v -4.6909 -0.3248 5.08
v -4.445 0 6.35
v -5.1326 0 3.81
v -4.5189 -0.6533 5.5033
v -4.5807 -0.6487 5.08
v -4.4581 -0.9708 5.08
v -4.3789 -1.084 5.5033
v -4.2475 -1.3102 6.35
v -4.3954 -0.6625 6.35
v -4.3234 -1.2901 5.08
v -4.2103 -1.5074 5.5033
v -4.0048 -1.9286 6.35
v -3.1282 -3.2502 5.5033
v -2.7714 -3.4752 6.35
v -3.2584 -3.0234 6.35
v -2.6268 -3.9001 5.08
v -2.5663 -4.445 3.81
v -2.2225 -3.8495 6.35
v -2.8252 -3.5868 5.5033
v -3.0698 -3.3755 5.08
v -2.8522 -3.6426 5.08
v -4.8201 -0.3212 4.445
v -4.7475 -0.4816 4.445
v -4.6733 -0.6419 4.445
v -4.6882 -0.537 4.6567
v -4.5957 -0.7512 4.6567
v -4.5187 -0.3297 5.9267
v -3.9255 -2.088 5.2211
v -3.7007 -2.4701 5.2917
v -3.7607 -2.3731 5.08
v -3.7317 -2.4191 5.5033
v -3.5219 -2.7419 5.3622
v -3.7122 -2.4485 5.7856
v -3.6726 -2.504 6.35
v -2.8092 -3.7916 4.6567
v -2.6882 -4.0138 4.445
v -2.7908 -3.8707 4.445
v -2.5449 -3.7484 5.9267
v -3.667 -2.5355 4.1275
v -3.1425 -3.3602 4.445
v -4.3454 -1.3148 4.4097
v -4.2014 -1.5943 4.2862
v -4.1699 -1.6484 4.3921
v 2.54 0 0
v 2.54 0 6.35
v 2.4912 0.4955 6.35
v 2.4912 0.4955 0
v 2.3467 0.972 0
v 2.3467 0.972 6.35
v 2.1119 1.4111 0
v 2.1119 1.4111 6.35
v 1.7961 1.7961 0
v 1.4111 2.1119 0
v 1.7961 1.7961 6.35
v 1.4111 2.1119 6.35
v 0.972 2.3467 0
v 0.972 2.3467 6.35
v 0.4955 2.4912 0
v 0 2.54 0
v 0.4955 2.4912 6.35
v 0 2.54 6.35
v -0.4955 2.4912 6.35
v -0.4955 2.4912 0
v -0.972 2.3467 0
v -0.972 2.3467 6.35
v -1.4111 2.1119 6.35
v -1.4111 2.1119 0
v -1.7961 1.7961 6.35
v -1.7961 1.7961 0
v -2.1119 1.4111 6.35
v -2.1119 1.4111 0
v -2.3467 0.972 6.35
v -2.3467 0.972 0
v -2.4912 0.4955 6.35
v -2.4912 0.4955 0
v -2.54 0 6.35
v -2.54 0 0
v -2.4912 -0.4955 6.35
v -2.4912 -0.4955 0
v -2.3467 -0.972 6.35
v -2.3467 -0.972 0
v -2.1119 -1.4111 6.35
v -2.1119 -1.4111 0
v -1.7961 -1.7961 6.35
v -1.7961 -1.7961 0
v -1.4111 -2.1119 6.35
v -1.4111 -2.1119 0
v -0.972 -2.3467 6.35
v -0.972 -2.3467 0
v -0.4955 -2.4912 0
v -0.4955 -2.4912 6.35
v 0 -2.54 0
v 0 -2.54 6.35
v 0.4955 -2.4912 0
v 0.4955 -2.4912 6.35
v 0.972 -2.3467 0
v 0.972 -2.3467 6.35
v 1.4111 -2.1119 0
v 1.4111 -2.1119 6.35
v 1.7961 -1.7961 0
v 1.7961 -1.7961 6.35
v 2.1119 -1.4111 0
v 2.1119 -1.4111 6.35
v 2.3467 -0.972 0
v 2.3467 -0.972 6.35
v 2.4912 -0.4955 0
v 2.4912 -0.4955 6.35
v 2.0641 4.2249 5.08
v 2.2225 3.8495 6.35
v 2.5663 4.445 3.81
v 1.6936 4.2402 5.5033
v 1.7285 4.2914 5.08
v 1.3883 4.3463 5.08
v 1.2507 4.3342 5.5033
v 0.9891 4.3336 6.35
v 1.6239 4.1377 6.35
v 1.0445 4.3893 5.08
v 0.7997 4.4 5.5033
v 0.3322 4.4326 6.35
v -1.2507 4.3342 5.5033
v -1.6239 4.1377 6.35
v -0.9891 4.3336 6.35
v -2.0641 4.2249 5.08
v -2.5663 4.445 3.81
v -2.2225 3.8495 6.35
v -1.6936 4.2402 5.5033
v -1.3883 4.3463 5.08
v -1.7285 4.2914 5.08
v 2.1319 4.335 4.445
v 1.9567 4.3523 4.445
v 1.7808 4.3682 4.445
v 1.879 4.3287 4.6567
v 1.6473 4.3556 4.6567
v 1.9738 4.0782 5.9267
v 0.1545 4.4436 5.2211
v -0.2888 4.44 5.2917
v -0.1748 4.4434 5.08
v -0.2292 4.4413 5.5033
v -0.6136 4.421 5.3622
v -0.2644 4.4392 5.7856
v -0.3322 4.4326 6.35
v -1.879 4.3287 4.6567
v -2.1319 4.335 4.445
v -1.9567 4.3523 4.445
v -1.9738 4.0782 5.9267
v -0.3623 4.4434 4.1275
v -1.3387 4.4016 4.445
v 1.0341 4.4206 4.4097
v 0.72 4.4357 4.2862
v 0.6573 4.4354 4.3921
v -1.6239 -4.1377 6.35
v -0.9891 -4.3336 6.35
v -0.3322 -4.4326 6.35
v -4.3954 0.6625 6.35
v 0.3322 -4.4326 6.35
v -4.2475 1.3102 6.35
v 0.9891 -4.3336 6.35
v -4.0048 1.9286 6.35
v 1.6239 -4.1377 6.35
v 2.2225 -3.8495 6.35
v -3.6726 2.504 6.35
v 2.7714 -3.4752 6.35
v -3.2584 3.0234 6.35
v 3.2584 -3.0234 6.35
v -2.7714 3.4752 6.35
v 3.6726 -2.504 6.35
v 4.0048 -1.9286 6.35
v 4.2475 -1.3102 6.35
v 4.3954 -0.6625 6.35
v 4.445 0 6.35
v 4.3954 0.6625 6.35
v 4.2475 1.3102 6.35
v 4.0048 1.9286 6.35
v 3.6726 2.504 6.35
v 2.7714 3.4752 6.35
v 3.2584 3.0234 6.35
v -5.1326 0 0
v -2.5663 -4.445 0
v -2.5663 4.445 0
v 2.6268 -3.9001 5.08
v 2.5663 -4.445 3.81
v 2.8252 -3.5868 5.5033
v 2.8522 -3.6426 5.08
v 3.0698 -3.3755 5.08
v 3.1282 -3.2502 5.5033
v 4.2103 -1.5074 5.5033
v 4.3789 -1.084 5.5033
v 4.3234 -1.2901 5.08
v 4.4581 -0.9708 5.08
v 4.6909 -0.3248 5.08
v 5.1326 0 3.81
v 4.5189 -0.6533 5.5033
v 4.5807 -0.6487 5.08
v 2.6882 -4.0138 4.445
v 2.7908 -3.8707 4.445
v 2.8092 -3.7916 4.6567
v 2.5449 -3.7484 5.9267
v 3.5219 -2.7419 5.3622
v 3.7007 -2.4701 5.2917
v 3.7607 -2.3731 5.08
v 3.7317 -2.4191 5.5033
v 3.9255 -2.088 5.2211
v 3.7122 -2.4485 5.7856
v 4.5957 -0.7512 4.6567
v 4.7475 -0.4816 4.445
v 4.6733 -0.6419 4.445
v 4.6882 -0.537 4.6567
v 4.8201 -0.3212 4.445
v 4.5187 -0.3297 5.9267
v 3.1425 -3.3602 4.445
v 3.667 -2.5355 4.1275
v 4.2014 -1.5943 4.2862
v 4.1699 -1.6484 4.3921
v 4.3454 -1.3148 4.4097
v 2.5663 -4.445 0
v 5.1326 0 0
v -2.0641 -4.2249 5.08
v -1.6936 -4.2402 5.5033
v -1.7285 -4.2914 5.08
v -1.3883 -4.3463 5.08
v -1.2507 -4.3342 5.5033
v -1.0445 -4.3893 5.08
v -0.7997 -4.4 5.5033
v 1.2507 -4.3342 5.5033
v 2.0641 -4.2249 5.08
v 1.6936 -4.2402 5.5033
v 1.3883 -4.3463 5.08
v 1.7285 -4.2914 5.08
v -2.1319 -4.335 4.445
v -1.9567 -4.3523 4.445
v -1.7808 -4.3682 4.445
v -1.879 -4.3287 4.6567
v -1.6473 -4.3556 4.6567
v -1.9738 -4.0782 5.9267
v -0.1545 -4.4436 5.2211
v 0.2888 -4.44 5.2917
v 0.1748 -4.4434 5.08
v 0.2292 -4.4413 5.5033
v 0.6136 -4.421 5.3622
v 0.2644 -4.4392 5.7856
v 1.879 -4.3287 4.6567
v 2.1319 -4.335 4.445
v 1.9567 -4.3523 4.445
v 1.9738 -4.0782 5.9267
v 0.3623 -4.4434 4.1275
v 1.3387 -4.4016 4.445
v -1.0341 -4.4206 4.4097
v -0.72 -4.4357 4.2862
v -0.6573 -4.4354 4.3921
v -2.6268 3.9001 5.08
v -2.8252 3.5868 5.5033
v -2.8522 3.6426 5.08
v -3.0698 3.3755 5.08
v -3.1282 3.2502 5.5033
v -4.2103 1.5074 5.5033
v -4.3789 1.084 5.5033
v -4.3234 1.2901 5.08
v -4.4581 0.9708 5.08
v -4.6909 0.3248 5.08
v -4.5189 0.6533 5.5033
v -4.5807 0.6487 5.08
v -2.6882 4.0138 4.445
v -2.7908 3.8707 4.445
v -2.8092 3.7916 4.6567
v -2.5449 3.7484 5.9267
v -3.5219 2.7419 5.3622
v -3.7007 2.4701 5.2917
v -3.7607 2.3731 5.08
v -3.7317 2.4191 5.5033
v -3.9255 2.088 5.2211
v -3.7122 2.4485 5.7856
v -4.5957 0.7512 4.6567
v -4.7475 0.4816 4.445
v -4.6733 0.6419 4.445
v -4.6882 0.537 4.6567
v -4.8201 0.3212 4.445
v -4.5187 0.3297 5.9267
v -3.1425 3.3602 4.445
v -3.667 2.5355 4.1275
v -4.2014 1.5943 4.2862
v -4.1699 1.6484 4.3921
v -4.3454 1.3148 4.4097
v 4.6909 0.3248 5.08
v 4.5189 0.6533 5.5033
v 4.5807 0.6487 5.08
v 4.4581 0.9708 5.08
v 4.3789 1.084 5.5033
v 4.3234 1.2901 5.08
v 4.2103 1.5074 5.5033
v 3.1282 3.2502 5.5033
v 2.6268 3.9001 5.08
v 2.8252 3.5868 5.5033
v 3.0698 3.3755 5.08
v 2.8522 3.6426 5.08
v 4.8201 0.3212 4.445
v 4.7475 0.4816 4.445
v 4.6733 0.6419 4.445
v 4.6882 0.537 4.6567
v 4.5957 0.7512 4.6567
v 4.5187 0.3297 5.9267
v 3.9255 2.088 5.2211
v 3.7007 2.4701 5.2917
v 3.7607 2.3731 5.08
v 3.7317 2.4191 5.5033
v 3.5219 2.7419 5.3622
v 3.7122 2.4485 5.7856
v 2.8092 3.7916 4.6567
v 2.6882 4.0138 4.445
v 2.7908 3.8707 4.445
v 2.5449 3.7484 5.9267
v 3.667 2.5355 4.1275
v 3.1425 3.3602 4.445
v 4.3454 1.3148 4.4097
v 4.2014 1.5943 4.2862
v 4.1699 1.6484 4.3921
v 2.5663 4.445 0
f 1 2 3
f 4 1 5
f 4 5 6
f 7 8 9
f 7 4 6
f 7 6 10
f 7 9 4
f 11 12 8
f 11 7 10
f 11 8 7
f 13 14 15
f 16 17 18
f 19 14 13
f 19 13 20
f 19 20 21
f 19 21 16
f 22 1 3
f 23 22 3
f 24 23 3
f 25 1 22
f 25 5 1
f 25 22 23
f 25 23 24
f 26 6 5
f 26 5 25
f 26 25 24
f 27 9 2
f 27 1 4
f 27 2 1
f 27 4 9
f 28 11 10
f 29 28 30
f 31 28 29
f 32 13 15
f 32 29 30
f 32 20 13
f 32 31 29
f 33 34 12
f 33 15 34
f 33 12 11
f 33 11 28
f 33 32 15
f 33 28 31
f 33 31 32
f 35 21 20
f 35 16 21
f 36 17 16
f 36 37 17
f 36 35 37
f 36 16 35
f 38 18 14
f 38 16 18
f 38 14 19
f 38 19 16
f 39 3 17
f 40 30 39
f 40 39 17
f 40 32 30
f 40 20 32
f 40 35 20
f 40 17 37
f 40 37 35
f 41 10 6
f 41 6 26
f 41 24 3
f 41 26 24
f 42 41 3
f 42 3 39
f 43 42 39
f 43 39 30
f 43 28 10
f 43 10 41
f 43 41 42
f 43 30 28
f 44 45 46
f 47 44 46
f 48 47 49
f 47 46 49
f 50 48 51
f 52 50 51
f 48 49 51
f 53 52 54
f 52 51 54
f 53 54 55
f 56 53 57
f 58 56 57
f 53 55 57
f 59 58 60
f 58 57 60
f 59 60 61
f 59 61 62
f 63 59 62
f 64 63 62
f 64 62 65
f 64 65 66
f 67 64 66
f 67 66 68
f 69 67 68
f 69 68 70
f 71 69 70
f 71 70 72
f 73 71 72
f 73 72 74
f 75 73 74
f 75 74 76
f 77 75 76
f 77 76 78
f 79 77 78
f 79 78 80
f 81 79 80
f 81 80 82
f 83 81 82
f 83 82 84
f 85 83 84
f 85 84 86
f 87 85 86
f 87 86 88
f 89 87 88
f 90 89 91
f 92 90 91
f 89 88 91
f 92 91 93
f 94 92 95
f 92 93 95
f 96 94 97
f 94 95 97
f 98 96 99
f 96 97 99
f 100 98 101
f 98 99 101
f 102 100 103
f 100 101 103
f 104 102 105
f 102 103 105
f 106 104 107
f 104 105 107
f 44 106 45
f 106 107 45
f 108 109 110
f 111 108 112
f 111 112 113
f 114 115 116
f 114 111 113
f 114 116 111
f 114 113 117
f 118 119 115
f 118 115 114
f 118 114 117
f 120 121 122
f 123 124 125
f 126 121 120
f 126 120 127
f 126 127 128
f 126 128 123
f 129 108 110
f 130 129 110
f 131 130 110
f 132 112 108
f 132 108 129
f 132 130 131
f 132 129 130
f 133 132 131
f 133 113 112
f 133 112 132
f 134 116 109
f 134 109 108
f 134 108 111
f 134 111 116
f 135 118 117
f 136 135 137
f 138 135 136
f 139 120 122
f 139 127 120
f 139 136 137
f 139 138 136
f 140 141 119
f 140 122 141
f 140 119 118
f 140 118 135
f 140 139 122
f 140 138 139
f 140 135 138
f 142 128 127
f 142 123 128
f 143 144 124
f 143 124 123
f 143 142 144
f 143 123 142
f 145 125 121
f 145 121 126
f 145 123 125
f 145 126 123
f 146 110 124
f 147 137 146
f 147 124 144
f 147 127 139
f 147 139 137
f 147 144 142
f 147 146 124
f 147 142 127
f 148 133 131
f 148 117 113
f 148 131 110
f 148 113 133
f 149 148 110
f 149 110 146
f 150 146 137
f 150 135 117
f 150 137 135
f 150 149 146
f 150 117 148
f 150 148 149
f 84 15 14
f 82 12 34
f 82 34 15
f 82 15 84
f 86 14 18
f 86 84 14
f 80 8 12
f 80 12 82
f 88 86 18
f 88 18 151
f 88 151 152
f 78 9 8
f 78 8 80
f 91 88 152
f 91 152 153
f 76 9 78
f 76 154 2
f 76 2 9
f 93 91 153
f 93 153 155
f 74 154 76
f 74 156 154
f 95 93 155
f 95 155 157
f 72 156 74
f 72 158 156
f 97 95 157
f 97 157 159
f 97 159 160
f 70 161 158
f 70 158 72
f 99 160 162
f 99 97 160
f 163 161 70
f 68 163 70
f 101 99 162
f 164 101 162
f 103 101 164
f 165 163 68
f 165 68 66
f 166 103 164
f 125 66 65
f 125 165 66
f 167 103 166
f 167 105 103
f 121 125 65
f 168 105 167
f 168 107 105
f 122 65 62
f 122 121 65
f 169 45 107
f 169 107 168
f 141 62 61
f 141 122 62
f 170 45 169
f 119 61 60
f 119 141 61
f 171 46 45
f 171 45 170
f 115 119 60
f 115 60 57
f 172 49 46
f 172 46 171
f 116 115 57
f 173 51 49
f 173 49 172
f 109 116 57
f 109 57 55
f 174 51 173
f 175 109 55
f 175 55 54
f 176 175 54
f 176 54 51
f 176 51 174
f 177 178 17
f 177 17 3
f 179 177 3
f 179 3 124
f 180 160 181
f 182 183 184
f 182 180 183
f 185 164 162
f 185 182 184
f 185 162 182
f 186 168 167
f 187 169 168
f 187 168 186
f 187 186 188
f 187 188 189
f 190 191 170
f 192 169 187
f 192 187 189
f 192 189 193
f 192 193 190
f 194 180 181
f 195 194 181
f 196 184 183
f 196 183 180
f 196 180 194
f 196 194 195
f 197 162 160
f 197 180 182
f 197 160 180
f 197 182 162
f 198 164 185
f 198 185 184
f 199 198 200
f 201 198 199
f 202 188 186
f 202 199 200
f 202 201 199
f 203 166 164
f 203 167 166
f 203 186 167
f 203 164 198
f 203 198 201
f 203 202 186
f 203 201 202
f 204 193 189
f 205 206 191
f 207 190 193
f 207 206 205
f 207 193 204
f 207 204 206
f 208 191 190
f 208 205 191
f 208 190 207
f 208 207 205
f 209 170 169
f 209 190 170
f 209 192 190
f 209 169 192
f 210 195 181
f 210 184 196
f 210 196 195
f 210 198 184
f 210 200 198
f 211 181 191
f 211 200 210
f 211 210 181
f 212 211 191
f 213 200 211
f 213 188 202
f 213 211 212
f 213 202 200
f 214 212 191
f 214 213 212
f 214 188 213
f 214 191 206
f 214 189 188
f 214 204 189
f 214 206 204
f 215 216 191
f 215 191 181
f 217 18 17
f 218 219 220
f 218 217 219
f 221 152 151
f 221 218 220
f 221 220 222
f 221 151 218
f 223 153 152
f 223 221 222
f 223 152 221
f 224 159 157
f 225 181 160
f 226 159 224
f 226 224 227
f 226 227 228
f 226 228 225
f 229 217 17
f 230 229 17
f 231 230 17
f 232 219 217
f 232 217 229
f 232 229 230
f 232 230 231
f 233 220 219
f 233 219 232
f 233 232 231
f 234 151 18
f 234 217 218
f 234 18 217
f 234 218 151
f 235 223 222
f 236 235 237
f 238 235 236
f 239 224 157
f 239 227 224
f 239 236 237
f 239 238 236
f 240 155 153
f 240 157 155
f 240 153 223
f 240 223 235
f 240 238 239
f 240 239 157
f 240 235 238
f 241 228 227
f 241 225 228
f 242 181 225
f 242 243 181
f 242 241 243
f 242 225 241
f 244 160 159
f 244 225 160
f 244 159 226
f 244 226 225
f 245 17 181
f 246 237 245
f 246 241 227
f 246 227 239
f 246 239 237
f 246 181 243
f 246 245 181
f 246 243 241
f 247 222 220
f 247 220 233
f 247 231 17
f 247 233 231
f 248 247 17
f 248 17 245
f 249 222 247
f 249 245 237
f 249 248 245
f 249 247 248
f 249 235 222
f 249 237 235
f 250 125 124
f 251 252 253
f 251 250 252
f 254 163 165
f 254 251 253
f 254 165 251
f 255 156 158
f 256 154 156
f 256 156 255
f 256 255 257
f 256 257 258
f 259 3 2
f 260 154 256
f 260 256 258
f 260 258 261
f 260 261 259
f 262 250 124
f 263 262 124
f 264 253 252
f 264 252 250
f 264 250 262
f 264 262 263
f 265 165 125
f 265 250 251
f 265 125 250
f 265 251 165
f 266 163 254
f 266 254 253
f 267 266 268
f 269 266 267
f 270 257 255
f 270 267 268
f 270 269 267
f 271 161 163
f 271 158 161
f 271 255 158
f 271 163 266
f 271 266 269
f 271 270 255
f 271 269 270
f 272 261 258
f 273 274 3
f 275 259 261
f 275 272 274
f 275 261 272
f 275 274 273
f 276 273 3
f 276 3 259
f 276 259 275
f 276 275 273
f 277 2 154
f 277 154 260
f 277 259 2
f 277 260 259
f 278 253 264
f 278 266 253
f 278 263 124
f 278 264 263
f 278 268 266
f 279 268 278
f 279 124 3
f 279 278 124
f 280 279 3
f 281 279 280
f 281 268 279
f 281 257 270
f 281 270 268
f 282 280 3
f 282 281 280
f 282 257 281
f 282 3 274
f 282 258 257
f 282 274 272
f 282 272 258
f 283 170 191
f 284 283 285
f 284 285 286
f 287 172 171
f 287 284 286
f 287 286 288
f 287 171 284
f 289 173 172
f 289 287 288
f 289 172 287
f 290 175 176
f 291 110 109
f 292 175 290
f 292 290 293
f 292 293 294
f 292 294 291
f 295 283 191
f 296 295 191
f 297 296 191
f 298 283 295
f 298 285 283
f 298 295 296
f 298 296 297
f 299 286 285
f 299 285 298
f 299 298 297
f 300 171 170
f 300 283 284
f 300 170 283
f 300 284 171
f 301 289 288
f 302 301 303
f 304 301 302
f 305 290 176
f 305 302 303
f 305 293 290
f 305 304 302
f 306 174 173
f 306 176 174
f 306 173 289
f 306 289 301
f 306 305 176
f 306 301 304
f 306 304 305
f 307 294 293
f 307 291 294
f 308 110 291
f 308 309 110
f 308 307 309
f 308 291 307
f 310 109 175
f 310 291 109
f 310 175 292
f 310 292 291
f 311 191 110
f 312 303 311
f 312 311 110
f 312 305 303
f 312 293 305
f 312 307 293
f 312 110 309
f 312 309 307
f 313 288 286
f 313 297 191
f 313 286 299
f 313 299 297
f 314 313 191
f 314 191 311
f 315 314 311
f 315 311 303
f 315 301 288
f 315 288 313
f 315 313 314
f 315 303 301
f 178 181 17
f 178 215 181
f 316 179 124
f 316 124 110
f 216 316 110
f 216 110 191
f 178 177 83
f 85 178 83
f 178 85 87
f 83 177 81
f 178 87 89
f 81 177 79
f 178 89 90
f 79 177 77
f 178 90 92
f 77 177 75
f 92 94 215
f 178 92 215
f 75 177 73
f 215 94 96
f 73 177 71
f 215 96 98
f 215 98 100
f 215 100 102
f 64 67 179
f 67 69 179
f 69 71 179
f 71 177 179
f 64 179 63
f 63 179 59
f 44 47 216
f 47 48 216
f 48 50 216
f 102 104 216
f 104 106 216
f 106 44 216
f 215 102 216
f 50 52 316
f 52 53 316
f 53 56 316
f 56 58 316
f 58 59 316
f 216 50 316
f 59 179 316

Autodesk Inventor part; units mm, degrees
ref_plane "YZ Plane" through (0, 0, 0) normal (1, 0, 0) x (0, 1, 0)
ref_plane "XZ Plane" through (0, 0, 0) normal (0, 1, 0) x (-1, 0, 0)
sketch "Sketch1" plane through (0, 0, 0) normal (0, 0, 1) x (1, 0, 0)
  line L0 (2.5663, 4.445) -> (5.1326, 0)
  line L1 (5.1326, 0) -> (2.5663, -4.445)
  line L2 (2.5663, -4.445) -> (-2.5663, -4.445)
  line L3 (-2.5663, -4.445) -> (-5.1326, 0)
  line L4 (-5.1326, 0) -> (-2.5663, 4.445)
  line L5 (-2.5663, 4.445) -> (2.5663, 4.445)
  line L6 (0, 0) -> (0.7817, 0)
  dimension "d0" = 8.89
extrude "Extrusion1" add sketch "Sketch1" along normal blind 3.81
sketch "Sketch2" plane through (0, 0, 3.81) normal (0, 0, 1) x (1, 0, 0)
  line L0 (5.1326, 0) -> (2.5663, 4.445) projected
  line L1 (2.5663, 4.445) -> (-2.5663, 4.445) projected
  line L2 (-2.5663, 4.445) -> (-5.1326, 0) projected
  line L3 (-5.1326, 0) -> (-2.5663, -4.445) projected
  line L4 (-2.5663, -4.445) -> (2.5663, -4.445) projected
  line L5 (2.5663, -4.445) -> (5.1326, 0) projected
  point P0 (0, 0)
ref_plane "Work Plane1" through (0, 0, 6.35) normal (0, 0, 1) x (1, 0, 0)
sketch "Sketch3" plane through (0, 0, 6.35) normal (0, 0, 1) x (1, 0, 0)
  circle A0 centre (0, 0) radius 4.445
  dimension "d4" = 8.89
loft "Loft1" add profiles "Sketch2", "Sketch3"
sketch "Sketch4" plane through (0, 0, 6.35) normal (0, 0, 1) x (1, 0, 0)
  circle A0 centre (0, 0) radius 2.54
  dimension "d9" = 5.08
extrude "Extrusion2" cut sketch "Sketch4" against normal blind 25.4
properties part number "RobotArm Nut2"
